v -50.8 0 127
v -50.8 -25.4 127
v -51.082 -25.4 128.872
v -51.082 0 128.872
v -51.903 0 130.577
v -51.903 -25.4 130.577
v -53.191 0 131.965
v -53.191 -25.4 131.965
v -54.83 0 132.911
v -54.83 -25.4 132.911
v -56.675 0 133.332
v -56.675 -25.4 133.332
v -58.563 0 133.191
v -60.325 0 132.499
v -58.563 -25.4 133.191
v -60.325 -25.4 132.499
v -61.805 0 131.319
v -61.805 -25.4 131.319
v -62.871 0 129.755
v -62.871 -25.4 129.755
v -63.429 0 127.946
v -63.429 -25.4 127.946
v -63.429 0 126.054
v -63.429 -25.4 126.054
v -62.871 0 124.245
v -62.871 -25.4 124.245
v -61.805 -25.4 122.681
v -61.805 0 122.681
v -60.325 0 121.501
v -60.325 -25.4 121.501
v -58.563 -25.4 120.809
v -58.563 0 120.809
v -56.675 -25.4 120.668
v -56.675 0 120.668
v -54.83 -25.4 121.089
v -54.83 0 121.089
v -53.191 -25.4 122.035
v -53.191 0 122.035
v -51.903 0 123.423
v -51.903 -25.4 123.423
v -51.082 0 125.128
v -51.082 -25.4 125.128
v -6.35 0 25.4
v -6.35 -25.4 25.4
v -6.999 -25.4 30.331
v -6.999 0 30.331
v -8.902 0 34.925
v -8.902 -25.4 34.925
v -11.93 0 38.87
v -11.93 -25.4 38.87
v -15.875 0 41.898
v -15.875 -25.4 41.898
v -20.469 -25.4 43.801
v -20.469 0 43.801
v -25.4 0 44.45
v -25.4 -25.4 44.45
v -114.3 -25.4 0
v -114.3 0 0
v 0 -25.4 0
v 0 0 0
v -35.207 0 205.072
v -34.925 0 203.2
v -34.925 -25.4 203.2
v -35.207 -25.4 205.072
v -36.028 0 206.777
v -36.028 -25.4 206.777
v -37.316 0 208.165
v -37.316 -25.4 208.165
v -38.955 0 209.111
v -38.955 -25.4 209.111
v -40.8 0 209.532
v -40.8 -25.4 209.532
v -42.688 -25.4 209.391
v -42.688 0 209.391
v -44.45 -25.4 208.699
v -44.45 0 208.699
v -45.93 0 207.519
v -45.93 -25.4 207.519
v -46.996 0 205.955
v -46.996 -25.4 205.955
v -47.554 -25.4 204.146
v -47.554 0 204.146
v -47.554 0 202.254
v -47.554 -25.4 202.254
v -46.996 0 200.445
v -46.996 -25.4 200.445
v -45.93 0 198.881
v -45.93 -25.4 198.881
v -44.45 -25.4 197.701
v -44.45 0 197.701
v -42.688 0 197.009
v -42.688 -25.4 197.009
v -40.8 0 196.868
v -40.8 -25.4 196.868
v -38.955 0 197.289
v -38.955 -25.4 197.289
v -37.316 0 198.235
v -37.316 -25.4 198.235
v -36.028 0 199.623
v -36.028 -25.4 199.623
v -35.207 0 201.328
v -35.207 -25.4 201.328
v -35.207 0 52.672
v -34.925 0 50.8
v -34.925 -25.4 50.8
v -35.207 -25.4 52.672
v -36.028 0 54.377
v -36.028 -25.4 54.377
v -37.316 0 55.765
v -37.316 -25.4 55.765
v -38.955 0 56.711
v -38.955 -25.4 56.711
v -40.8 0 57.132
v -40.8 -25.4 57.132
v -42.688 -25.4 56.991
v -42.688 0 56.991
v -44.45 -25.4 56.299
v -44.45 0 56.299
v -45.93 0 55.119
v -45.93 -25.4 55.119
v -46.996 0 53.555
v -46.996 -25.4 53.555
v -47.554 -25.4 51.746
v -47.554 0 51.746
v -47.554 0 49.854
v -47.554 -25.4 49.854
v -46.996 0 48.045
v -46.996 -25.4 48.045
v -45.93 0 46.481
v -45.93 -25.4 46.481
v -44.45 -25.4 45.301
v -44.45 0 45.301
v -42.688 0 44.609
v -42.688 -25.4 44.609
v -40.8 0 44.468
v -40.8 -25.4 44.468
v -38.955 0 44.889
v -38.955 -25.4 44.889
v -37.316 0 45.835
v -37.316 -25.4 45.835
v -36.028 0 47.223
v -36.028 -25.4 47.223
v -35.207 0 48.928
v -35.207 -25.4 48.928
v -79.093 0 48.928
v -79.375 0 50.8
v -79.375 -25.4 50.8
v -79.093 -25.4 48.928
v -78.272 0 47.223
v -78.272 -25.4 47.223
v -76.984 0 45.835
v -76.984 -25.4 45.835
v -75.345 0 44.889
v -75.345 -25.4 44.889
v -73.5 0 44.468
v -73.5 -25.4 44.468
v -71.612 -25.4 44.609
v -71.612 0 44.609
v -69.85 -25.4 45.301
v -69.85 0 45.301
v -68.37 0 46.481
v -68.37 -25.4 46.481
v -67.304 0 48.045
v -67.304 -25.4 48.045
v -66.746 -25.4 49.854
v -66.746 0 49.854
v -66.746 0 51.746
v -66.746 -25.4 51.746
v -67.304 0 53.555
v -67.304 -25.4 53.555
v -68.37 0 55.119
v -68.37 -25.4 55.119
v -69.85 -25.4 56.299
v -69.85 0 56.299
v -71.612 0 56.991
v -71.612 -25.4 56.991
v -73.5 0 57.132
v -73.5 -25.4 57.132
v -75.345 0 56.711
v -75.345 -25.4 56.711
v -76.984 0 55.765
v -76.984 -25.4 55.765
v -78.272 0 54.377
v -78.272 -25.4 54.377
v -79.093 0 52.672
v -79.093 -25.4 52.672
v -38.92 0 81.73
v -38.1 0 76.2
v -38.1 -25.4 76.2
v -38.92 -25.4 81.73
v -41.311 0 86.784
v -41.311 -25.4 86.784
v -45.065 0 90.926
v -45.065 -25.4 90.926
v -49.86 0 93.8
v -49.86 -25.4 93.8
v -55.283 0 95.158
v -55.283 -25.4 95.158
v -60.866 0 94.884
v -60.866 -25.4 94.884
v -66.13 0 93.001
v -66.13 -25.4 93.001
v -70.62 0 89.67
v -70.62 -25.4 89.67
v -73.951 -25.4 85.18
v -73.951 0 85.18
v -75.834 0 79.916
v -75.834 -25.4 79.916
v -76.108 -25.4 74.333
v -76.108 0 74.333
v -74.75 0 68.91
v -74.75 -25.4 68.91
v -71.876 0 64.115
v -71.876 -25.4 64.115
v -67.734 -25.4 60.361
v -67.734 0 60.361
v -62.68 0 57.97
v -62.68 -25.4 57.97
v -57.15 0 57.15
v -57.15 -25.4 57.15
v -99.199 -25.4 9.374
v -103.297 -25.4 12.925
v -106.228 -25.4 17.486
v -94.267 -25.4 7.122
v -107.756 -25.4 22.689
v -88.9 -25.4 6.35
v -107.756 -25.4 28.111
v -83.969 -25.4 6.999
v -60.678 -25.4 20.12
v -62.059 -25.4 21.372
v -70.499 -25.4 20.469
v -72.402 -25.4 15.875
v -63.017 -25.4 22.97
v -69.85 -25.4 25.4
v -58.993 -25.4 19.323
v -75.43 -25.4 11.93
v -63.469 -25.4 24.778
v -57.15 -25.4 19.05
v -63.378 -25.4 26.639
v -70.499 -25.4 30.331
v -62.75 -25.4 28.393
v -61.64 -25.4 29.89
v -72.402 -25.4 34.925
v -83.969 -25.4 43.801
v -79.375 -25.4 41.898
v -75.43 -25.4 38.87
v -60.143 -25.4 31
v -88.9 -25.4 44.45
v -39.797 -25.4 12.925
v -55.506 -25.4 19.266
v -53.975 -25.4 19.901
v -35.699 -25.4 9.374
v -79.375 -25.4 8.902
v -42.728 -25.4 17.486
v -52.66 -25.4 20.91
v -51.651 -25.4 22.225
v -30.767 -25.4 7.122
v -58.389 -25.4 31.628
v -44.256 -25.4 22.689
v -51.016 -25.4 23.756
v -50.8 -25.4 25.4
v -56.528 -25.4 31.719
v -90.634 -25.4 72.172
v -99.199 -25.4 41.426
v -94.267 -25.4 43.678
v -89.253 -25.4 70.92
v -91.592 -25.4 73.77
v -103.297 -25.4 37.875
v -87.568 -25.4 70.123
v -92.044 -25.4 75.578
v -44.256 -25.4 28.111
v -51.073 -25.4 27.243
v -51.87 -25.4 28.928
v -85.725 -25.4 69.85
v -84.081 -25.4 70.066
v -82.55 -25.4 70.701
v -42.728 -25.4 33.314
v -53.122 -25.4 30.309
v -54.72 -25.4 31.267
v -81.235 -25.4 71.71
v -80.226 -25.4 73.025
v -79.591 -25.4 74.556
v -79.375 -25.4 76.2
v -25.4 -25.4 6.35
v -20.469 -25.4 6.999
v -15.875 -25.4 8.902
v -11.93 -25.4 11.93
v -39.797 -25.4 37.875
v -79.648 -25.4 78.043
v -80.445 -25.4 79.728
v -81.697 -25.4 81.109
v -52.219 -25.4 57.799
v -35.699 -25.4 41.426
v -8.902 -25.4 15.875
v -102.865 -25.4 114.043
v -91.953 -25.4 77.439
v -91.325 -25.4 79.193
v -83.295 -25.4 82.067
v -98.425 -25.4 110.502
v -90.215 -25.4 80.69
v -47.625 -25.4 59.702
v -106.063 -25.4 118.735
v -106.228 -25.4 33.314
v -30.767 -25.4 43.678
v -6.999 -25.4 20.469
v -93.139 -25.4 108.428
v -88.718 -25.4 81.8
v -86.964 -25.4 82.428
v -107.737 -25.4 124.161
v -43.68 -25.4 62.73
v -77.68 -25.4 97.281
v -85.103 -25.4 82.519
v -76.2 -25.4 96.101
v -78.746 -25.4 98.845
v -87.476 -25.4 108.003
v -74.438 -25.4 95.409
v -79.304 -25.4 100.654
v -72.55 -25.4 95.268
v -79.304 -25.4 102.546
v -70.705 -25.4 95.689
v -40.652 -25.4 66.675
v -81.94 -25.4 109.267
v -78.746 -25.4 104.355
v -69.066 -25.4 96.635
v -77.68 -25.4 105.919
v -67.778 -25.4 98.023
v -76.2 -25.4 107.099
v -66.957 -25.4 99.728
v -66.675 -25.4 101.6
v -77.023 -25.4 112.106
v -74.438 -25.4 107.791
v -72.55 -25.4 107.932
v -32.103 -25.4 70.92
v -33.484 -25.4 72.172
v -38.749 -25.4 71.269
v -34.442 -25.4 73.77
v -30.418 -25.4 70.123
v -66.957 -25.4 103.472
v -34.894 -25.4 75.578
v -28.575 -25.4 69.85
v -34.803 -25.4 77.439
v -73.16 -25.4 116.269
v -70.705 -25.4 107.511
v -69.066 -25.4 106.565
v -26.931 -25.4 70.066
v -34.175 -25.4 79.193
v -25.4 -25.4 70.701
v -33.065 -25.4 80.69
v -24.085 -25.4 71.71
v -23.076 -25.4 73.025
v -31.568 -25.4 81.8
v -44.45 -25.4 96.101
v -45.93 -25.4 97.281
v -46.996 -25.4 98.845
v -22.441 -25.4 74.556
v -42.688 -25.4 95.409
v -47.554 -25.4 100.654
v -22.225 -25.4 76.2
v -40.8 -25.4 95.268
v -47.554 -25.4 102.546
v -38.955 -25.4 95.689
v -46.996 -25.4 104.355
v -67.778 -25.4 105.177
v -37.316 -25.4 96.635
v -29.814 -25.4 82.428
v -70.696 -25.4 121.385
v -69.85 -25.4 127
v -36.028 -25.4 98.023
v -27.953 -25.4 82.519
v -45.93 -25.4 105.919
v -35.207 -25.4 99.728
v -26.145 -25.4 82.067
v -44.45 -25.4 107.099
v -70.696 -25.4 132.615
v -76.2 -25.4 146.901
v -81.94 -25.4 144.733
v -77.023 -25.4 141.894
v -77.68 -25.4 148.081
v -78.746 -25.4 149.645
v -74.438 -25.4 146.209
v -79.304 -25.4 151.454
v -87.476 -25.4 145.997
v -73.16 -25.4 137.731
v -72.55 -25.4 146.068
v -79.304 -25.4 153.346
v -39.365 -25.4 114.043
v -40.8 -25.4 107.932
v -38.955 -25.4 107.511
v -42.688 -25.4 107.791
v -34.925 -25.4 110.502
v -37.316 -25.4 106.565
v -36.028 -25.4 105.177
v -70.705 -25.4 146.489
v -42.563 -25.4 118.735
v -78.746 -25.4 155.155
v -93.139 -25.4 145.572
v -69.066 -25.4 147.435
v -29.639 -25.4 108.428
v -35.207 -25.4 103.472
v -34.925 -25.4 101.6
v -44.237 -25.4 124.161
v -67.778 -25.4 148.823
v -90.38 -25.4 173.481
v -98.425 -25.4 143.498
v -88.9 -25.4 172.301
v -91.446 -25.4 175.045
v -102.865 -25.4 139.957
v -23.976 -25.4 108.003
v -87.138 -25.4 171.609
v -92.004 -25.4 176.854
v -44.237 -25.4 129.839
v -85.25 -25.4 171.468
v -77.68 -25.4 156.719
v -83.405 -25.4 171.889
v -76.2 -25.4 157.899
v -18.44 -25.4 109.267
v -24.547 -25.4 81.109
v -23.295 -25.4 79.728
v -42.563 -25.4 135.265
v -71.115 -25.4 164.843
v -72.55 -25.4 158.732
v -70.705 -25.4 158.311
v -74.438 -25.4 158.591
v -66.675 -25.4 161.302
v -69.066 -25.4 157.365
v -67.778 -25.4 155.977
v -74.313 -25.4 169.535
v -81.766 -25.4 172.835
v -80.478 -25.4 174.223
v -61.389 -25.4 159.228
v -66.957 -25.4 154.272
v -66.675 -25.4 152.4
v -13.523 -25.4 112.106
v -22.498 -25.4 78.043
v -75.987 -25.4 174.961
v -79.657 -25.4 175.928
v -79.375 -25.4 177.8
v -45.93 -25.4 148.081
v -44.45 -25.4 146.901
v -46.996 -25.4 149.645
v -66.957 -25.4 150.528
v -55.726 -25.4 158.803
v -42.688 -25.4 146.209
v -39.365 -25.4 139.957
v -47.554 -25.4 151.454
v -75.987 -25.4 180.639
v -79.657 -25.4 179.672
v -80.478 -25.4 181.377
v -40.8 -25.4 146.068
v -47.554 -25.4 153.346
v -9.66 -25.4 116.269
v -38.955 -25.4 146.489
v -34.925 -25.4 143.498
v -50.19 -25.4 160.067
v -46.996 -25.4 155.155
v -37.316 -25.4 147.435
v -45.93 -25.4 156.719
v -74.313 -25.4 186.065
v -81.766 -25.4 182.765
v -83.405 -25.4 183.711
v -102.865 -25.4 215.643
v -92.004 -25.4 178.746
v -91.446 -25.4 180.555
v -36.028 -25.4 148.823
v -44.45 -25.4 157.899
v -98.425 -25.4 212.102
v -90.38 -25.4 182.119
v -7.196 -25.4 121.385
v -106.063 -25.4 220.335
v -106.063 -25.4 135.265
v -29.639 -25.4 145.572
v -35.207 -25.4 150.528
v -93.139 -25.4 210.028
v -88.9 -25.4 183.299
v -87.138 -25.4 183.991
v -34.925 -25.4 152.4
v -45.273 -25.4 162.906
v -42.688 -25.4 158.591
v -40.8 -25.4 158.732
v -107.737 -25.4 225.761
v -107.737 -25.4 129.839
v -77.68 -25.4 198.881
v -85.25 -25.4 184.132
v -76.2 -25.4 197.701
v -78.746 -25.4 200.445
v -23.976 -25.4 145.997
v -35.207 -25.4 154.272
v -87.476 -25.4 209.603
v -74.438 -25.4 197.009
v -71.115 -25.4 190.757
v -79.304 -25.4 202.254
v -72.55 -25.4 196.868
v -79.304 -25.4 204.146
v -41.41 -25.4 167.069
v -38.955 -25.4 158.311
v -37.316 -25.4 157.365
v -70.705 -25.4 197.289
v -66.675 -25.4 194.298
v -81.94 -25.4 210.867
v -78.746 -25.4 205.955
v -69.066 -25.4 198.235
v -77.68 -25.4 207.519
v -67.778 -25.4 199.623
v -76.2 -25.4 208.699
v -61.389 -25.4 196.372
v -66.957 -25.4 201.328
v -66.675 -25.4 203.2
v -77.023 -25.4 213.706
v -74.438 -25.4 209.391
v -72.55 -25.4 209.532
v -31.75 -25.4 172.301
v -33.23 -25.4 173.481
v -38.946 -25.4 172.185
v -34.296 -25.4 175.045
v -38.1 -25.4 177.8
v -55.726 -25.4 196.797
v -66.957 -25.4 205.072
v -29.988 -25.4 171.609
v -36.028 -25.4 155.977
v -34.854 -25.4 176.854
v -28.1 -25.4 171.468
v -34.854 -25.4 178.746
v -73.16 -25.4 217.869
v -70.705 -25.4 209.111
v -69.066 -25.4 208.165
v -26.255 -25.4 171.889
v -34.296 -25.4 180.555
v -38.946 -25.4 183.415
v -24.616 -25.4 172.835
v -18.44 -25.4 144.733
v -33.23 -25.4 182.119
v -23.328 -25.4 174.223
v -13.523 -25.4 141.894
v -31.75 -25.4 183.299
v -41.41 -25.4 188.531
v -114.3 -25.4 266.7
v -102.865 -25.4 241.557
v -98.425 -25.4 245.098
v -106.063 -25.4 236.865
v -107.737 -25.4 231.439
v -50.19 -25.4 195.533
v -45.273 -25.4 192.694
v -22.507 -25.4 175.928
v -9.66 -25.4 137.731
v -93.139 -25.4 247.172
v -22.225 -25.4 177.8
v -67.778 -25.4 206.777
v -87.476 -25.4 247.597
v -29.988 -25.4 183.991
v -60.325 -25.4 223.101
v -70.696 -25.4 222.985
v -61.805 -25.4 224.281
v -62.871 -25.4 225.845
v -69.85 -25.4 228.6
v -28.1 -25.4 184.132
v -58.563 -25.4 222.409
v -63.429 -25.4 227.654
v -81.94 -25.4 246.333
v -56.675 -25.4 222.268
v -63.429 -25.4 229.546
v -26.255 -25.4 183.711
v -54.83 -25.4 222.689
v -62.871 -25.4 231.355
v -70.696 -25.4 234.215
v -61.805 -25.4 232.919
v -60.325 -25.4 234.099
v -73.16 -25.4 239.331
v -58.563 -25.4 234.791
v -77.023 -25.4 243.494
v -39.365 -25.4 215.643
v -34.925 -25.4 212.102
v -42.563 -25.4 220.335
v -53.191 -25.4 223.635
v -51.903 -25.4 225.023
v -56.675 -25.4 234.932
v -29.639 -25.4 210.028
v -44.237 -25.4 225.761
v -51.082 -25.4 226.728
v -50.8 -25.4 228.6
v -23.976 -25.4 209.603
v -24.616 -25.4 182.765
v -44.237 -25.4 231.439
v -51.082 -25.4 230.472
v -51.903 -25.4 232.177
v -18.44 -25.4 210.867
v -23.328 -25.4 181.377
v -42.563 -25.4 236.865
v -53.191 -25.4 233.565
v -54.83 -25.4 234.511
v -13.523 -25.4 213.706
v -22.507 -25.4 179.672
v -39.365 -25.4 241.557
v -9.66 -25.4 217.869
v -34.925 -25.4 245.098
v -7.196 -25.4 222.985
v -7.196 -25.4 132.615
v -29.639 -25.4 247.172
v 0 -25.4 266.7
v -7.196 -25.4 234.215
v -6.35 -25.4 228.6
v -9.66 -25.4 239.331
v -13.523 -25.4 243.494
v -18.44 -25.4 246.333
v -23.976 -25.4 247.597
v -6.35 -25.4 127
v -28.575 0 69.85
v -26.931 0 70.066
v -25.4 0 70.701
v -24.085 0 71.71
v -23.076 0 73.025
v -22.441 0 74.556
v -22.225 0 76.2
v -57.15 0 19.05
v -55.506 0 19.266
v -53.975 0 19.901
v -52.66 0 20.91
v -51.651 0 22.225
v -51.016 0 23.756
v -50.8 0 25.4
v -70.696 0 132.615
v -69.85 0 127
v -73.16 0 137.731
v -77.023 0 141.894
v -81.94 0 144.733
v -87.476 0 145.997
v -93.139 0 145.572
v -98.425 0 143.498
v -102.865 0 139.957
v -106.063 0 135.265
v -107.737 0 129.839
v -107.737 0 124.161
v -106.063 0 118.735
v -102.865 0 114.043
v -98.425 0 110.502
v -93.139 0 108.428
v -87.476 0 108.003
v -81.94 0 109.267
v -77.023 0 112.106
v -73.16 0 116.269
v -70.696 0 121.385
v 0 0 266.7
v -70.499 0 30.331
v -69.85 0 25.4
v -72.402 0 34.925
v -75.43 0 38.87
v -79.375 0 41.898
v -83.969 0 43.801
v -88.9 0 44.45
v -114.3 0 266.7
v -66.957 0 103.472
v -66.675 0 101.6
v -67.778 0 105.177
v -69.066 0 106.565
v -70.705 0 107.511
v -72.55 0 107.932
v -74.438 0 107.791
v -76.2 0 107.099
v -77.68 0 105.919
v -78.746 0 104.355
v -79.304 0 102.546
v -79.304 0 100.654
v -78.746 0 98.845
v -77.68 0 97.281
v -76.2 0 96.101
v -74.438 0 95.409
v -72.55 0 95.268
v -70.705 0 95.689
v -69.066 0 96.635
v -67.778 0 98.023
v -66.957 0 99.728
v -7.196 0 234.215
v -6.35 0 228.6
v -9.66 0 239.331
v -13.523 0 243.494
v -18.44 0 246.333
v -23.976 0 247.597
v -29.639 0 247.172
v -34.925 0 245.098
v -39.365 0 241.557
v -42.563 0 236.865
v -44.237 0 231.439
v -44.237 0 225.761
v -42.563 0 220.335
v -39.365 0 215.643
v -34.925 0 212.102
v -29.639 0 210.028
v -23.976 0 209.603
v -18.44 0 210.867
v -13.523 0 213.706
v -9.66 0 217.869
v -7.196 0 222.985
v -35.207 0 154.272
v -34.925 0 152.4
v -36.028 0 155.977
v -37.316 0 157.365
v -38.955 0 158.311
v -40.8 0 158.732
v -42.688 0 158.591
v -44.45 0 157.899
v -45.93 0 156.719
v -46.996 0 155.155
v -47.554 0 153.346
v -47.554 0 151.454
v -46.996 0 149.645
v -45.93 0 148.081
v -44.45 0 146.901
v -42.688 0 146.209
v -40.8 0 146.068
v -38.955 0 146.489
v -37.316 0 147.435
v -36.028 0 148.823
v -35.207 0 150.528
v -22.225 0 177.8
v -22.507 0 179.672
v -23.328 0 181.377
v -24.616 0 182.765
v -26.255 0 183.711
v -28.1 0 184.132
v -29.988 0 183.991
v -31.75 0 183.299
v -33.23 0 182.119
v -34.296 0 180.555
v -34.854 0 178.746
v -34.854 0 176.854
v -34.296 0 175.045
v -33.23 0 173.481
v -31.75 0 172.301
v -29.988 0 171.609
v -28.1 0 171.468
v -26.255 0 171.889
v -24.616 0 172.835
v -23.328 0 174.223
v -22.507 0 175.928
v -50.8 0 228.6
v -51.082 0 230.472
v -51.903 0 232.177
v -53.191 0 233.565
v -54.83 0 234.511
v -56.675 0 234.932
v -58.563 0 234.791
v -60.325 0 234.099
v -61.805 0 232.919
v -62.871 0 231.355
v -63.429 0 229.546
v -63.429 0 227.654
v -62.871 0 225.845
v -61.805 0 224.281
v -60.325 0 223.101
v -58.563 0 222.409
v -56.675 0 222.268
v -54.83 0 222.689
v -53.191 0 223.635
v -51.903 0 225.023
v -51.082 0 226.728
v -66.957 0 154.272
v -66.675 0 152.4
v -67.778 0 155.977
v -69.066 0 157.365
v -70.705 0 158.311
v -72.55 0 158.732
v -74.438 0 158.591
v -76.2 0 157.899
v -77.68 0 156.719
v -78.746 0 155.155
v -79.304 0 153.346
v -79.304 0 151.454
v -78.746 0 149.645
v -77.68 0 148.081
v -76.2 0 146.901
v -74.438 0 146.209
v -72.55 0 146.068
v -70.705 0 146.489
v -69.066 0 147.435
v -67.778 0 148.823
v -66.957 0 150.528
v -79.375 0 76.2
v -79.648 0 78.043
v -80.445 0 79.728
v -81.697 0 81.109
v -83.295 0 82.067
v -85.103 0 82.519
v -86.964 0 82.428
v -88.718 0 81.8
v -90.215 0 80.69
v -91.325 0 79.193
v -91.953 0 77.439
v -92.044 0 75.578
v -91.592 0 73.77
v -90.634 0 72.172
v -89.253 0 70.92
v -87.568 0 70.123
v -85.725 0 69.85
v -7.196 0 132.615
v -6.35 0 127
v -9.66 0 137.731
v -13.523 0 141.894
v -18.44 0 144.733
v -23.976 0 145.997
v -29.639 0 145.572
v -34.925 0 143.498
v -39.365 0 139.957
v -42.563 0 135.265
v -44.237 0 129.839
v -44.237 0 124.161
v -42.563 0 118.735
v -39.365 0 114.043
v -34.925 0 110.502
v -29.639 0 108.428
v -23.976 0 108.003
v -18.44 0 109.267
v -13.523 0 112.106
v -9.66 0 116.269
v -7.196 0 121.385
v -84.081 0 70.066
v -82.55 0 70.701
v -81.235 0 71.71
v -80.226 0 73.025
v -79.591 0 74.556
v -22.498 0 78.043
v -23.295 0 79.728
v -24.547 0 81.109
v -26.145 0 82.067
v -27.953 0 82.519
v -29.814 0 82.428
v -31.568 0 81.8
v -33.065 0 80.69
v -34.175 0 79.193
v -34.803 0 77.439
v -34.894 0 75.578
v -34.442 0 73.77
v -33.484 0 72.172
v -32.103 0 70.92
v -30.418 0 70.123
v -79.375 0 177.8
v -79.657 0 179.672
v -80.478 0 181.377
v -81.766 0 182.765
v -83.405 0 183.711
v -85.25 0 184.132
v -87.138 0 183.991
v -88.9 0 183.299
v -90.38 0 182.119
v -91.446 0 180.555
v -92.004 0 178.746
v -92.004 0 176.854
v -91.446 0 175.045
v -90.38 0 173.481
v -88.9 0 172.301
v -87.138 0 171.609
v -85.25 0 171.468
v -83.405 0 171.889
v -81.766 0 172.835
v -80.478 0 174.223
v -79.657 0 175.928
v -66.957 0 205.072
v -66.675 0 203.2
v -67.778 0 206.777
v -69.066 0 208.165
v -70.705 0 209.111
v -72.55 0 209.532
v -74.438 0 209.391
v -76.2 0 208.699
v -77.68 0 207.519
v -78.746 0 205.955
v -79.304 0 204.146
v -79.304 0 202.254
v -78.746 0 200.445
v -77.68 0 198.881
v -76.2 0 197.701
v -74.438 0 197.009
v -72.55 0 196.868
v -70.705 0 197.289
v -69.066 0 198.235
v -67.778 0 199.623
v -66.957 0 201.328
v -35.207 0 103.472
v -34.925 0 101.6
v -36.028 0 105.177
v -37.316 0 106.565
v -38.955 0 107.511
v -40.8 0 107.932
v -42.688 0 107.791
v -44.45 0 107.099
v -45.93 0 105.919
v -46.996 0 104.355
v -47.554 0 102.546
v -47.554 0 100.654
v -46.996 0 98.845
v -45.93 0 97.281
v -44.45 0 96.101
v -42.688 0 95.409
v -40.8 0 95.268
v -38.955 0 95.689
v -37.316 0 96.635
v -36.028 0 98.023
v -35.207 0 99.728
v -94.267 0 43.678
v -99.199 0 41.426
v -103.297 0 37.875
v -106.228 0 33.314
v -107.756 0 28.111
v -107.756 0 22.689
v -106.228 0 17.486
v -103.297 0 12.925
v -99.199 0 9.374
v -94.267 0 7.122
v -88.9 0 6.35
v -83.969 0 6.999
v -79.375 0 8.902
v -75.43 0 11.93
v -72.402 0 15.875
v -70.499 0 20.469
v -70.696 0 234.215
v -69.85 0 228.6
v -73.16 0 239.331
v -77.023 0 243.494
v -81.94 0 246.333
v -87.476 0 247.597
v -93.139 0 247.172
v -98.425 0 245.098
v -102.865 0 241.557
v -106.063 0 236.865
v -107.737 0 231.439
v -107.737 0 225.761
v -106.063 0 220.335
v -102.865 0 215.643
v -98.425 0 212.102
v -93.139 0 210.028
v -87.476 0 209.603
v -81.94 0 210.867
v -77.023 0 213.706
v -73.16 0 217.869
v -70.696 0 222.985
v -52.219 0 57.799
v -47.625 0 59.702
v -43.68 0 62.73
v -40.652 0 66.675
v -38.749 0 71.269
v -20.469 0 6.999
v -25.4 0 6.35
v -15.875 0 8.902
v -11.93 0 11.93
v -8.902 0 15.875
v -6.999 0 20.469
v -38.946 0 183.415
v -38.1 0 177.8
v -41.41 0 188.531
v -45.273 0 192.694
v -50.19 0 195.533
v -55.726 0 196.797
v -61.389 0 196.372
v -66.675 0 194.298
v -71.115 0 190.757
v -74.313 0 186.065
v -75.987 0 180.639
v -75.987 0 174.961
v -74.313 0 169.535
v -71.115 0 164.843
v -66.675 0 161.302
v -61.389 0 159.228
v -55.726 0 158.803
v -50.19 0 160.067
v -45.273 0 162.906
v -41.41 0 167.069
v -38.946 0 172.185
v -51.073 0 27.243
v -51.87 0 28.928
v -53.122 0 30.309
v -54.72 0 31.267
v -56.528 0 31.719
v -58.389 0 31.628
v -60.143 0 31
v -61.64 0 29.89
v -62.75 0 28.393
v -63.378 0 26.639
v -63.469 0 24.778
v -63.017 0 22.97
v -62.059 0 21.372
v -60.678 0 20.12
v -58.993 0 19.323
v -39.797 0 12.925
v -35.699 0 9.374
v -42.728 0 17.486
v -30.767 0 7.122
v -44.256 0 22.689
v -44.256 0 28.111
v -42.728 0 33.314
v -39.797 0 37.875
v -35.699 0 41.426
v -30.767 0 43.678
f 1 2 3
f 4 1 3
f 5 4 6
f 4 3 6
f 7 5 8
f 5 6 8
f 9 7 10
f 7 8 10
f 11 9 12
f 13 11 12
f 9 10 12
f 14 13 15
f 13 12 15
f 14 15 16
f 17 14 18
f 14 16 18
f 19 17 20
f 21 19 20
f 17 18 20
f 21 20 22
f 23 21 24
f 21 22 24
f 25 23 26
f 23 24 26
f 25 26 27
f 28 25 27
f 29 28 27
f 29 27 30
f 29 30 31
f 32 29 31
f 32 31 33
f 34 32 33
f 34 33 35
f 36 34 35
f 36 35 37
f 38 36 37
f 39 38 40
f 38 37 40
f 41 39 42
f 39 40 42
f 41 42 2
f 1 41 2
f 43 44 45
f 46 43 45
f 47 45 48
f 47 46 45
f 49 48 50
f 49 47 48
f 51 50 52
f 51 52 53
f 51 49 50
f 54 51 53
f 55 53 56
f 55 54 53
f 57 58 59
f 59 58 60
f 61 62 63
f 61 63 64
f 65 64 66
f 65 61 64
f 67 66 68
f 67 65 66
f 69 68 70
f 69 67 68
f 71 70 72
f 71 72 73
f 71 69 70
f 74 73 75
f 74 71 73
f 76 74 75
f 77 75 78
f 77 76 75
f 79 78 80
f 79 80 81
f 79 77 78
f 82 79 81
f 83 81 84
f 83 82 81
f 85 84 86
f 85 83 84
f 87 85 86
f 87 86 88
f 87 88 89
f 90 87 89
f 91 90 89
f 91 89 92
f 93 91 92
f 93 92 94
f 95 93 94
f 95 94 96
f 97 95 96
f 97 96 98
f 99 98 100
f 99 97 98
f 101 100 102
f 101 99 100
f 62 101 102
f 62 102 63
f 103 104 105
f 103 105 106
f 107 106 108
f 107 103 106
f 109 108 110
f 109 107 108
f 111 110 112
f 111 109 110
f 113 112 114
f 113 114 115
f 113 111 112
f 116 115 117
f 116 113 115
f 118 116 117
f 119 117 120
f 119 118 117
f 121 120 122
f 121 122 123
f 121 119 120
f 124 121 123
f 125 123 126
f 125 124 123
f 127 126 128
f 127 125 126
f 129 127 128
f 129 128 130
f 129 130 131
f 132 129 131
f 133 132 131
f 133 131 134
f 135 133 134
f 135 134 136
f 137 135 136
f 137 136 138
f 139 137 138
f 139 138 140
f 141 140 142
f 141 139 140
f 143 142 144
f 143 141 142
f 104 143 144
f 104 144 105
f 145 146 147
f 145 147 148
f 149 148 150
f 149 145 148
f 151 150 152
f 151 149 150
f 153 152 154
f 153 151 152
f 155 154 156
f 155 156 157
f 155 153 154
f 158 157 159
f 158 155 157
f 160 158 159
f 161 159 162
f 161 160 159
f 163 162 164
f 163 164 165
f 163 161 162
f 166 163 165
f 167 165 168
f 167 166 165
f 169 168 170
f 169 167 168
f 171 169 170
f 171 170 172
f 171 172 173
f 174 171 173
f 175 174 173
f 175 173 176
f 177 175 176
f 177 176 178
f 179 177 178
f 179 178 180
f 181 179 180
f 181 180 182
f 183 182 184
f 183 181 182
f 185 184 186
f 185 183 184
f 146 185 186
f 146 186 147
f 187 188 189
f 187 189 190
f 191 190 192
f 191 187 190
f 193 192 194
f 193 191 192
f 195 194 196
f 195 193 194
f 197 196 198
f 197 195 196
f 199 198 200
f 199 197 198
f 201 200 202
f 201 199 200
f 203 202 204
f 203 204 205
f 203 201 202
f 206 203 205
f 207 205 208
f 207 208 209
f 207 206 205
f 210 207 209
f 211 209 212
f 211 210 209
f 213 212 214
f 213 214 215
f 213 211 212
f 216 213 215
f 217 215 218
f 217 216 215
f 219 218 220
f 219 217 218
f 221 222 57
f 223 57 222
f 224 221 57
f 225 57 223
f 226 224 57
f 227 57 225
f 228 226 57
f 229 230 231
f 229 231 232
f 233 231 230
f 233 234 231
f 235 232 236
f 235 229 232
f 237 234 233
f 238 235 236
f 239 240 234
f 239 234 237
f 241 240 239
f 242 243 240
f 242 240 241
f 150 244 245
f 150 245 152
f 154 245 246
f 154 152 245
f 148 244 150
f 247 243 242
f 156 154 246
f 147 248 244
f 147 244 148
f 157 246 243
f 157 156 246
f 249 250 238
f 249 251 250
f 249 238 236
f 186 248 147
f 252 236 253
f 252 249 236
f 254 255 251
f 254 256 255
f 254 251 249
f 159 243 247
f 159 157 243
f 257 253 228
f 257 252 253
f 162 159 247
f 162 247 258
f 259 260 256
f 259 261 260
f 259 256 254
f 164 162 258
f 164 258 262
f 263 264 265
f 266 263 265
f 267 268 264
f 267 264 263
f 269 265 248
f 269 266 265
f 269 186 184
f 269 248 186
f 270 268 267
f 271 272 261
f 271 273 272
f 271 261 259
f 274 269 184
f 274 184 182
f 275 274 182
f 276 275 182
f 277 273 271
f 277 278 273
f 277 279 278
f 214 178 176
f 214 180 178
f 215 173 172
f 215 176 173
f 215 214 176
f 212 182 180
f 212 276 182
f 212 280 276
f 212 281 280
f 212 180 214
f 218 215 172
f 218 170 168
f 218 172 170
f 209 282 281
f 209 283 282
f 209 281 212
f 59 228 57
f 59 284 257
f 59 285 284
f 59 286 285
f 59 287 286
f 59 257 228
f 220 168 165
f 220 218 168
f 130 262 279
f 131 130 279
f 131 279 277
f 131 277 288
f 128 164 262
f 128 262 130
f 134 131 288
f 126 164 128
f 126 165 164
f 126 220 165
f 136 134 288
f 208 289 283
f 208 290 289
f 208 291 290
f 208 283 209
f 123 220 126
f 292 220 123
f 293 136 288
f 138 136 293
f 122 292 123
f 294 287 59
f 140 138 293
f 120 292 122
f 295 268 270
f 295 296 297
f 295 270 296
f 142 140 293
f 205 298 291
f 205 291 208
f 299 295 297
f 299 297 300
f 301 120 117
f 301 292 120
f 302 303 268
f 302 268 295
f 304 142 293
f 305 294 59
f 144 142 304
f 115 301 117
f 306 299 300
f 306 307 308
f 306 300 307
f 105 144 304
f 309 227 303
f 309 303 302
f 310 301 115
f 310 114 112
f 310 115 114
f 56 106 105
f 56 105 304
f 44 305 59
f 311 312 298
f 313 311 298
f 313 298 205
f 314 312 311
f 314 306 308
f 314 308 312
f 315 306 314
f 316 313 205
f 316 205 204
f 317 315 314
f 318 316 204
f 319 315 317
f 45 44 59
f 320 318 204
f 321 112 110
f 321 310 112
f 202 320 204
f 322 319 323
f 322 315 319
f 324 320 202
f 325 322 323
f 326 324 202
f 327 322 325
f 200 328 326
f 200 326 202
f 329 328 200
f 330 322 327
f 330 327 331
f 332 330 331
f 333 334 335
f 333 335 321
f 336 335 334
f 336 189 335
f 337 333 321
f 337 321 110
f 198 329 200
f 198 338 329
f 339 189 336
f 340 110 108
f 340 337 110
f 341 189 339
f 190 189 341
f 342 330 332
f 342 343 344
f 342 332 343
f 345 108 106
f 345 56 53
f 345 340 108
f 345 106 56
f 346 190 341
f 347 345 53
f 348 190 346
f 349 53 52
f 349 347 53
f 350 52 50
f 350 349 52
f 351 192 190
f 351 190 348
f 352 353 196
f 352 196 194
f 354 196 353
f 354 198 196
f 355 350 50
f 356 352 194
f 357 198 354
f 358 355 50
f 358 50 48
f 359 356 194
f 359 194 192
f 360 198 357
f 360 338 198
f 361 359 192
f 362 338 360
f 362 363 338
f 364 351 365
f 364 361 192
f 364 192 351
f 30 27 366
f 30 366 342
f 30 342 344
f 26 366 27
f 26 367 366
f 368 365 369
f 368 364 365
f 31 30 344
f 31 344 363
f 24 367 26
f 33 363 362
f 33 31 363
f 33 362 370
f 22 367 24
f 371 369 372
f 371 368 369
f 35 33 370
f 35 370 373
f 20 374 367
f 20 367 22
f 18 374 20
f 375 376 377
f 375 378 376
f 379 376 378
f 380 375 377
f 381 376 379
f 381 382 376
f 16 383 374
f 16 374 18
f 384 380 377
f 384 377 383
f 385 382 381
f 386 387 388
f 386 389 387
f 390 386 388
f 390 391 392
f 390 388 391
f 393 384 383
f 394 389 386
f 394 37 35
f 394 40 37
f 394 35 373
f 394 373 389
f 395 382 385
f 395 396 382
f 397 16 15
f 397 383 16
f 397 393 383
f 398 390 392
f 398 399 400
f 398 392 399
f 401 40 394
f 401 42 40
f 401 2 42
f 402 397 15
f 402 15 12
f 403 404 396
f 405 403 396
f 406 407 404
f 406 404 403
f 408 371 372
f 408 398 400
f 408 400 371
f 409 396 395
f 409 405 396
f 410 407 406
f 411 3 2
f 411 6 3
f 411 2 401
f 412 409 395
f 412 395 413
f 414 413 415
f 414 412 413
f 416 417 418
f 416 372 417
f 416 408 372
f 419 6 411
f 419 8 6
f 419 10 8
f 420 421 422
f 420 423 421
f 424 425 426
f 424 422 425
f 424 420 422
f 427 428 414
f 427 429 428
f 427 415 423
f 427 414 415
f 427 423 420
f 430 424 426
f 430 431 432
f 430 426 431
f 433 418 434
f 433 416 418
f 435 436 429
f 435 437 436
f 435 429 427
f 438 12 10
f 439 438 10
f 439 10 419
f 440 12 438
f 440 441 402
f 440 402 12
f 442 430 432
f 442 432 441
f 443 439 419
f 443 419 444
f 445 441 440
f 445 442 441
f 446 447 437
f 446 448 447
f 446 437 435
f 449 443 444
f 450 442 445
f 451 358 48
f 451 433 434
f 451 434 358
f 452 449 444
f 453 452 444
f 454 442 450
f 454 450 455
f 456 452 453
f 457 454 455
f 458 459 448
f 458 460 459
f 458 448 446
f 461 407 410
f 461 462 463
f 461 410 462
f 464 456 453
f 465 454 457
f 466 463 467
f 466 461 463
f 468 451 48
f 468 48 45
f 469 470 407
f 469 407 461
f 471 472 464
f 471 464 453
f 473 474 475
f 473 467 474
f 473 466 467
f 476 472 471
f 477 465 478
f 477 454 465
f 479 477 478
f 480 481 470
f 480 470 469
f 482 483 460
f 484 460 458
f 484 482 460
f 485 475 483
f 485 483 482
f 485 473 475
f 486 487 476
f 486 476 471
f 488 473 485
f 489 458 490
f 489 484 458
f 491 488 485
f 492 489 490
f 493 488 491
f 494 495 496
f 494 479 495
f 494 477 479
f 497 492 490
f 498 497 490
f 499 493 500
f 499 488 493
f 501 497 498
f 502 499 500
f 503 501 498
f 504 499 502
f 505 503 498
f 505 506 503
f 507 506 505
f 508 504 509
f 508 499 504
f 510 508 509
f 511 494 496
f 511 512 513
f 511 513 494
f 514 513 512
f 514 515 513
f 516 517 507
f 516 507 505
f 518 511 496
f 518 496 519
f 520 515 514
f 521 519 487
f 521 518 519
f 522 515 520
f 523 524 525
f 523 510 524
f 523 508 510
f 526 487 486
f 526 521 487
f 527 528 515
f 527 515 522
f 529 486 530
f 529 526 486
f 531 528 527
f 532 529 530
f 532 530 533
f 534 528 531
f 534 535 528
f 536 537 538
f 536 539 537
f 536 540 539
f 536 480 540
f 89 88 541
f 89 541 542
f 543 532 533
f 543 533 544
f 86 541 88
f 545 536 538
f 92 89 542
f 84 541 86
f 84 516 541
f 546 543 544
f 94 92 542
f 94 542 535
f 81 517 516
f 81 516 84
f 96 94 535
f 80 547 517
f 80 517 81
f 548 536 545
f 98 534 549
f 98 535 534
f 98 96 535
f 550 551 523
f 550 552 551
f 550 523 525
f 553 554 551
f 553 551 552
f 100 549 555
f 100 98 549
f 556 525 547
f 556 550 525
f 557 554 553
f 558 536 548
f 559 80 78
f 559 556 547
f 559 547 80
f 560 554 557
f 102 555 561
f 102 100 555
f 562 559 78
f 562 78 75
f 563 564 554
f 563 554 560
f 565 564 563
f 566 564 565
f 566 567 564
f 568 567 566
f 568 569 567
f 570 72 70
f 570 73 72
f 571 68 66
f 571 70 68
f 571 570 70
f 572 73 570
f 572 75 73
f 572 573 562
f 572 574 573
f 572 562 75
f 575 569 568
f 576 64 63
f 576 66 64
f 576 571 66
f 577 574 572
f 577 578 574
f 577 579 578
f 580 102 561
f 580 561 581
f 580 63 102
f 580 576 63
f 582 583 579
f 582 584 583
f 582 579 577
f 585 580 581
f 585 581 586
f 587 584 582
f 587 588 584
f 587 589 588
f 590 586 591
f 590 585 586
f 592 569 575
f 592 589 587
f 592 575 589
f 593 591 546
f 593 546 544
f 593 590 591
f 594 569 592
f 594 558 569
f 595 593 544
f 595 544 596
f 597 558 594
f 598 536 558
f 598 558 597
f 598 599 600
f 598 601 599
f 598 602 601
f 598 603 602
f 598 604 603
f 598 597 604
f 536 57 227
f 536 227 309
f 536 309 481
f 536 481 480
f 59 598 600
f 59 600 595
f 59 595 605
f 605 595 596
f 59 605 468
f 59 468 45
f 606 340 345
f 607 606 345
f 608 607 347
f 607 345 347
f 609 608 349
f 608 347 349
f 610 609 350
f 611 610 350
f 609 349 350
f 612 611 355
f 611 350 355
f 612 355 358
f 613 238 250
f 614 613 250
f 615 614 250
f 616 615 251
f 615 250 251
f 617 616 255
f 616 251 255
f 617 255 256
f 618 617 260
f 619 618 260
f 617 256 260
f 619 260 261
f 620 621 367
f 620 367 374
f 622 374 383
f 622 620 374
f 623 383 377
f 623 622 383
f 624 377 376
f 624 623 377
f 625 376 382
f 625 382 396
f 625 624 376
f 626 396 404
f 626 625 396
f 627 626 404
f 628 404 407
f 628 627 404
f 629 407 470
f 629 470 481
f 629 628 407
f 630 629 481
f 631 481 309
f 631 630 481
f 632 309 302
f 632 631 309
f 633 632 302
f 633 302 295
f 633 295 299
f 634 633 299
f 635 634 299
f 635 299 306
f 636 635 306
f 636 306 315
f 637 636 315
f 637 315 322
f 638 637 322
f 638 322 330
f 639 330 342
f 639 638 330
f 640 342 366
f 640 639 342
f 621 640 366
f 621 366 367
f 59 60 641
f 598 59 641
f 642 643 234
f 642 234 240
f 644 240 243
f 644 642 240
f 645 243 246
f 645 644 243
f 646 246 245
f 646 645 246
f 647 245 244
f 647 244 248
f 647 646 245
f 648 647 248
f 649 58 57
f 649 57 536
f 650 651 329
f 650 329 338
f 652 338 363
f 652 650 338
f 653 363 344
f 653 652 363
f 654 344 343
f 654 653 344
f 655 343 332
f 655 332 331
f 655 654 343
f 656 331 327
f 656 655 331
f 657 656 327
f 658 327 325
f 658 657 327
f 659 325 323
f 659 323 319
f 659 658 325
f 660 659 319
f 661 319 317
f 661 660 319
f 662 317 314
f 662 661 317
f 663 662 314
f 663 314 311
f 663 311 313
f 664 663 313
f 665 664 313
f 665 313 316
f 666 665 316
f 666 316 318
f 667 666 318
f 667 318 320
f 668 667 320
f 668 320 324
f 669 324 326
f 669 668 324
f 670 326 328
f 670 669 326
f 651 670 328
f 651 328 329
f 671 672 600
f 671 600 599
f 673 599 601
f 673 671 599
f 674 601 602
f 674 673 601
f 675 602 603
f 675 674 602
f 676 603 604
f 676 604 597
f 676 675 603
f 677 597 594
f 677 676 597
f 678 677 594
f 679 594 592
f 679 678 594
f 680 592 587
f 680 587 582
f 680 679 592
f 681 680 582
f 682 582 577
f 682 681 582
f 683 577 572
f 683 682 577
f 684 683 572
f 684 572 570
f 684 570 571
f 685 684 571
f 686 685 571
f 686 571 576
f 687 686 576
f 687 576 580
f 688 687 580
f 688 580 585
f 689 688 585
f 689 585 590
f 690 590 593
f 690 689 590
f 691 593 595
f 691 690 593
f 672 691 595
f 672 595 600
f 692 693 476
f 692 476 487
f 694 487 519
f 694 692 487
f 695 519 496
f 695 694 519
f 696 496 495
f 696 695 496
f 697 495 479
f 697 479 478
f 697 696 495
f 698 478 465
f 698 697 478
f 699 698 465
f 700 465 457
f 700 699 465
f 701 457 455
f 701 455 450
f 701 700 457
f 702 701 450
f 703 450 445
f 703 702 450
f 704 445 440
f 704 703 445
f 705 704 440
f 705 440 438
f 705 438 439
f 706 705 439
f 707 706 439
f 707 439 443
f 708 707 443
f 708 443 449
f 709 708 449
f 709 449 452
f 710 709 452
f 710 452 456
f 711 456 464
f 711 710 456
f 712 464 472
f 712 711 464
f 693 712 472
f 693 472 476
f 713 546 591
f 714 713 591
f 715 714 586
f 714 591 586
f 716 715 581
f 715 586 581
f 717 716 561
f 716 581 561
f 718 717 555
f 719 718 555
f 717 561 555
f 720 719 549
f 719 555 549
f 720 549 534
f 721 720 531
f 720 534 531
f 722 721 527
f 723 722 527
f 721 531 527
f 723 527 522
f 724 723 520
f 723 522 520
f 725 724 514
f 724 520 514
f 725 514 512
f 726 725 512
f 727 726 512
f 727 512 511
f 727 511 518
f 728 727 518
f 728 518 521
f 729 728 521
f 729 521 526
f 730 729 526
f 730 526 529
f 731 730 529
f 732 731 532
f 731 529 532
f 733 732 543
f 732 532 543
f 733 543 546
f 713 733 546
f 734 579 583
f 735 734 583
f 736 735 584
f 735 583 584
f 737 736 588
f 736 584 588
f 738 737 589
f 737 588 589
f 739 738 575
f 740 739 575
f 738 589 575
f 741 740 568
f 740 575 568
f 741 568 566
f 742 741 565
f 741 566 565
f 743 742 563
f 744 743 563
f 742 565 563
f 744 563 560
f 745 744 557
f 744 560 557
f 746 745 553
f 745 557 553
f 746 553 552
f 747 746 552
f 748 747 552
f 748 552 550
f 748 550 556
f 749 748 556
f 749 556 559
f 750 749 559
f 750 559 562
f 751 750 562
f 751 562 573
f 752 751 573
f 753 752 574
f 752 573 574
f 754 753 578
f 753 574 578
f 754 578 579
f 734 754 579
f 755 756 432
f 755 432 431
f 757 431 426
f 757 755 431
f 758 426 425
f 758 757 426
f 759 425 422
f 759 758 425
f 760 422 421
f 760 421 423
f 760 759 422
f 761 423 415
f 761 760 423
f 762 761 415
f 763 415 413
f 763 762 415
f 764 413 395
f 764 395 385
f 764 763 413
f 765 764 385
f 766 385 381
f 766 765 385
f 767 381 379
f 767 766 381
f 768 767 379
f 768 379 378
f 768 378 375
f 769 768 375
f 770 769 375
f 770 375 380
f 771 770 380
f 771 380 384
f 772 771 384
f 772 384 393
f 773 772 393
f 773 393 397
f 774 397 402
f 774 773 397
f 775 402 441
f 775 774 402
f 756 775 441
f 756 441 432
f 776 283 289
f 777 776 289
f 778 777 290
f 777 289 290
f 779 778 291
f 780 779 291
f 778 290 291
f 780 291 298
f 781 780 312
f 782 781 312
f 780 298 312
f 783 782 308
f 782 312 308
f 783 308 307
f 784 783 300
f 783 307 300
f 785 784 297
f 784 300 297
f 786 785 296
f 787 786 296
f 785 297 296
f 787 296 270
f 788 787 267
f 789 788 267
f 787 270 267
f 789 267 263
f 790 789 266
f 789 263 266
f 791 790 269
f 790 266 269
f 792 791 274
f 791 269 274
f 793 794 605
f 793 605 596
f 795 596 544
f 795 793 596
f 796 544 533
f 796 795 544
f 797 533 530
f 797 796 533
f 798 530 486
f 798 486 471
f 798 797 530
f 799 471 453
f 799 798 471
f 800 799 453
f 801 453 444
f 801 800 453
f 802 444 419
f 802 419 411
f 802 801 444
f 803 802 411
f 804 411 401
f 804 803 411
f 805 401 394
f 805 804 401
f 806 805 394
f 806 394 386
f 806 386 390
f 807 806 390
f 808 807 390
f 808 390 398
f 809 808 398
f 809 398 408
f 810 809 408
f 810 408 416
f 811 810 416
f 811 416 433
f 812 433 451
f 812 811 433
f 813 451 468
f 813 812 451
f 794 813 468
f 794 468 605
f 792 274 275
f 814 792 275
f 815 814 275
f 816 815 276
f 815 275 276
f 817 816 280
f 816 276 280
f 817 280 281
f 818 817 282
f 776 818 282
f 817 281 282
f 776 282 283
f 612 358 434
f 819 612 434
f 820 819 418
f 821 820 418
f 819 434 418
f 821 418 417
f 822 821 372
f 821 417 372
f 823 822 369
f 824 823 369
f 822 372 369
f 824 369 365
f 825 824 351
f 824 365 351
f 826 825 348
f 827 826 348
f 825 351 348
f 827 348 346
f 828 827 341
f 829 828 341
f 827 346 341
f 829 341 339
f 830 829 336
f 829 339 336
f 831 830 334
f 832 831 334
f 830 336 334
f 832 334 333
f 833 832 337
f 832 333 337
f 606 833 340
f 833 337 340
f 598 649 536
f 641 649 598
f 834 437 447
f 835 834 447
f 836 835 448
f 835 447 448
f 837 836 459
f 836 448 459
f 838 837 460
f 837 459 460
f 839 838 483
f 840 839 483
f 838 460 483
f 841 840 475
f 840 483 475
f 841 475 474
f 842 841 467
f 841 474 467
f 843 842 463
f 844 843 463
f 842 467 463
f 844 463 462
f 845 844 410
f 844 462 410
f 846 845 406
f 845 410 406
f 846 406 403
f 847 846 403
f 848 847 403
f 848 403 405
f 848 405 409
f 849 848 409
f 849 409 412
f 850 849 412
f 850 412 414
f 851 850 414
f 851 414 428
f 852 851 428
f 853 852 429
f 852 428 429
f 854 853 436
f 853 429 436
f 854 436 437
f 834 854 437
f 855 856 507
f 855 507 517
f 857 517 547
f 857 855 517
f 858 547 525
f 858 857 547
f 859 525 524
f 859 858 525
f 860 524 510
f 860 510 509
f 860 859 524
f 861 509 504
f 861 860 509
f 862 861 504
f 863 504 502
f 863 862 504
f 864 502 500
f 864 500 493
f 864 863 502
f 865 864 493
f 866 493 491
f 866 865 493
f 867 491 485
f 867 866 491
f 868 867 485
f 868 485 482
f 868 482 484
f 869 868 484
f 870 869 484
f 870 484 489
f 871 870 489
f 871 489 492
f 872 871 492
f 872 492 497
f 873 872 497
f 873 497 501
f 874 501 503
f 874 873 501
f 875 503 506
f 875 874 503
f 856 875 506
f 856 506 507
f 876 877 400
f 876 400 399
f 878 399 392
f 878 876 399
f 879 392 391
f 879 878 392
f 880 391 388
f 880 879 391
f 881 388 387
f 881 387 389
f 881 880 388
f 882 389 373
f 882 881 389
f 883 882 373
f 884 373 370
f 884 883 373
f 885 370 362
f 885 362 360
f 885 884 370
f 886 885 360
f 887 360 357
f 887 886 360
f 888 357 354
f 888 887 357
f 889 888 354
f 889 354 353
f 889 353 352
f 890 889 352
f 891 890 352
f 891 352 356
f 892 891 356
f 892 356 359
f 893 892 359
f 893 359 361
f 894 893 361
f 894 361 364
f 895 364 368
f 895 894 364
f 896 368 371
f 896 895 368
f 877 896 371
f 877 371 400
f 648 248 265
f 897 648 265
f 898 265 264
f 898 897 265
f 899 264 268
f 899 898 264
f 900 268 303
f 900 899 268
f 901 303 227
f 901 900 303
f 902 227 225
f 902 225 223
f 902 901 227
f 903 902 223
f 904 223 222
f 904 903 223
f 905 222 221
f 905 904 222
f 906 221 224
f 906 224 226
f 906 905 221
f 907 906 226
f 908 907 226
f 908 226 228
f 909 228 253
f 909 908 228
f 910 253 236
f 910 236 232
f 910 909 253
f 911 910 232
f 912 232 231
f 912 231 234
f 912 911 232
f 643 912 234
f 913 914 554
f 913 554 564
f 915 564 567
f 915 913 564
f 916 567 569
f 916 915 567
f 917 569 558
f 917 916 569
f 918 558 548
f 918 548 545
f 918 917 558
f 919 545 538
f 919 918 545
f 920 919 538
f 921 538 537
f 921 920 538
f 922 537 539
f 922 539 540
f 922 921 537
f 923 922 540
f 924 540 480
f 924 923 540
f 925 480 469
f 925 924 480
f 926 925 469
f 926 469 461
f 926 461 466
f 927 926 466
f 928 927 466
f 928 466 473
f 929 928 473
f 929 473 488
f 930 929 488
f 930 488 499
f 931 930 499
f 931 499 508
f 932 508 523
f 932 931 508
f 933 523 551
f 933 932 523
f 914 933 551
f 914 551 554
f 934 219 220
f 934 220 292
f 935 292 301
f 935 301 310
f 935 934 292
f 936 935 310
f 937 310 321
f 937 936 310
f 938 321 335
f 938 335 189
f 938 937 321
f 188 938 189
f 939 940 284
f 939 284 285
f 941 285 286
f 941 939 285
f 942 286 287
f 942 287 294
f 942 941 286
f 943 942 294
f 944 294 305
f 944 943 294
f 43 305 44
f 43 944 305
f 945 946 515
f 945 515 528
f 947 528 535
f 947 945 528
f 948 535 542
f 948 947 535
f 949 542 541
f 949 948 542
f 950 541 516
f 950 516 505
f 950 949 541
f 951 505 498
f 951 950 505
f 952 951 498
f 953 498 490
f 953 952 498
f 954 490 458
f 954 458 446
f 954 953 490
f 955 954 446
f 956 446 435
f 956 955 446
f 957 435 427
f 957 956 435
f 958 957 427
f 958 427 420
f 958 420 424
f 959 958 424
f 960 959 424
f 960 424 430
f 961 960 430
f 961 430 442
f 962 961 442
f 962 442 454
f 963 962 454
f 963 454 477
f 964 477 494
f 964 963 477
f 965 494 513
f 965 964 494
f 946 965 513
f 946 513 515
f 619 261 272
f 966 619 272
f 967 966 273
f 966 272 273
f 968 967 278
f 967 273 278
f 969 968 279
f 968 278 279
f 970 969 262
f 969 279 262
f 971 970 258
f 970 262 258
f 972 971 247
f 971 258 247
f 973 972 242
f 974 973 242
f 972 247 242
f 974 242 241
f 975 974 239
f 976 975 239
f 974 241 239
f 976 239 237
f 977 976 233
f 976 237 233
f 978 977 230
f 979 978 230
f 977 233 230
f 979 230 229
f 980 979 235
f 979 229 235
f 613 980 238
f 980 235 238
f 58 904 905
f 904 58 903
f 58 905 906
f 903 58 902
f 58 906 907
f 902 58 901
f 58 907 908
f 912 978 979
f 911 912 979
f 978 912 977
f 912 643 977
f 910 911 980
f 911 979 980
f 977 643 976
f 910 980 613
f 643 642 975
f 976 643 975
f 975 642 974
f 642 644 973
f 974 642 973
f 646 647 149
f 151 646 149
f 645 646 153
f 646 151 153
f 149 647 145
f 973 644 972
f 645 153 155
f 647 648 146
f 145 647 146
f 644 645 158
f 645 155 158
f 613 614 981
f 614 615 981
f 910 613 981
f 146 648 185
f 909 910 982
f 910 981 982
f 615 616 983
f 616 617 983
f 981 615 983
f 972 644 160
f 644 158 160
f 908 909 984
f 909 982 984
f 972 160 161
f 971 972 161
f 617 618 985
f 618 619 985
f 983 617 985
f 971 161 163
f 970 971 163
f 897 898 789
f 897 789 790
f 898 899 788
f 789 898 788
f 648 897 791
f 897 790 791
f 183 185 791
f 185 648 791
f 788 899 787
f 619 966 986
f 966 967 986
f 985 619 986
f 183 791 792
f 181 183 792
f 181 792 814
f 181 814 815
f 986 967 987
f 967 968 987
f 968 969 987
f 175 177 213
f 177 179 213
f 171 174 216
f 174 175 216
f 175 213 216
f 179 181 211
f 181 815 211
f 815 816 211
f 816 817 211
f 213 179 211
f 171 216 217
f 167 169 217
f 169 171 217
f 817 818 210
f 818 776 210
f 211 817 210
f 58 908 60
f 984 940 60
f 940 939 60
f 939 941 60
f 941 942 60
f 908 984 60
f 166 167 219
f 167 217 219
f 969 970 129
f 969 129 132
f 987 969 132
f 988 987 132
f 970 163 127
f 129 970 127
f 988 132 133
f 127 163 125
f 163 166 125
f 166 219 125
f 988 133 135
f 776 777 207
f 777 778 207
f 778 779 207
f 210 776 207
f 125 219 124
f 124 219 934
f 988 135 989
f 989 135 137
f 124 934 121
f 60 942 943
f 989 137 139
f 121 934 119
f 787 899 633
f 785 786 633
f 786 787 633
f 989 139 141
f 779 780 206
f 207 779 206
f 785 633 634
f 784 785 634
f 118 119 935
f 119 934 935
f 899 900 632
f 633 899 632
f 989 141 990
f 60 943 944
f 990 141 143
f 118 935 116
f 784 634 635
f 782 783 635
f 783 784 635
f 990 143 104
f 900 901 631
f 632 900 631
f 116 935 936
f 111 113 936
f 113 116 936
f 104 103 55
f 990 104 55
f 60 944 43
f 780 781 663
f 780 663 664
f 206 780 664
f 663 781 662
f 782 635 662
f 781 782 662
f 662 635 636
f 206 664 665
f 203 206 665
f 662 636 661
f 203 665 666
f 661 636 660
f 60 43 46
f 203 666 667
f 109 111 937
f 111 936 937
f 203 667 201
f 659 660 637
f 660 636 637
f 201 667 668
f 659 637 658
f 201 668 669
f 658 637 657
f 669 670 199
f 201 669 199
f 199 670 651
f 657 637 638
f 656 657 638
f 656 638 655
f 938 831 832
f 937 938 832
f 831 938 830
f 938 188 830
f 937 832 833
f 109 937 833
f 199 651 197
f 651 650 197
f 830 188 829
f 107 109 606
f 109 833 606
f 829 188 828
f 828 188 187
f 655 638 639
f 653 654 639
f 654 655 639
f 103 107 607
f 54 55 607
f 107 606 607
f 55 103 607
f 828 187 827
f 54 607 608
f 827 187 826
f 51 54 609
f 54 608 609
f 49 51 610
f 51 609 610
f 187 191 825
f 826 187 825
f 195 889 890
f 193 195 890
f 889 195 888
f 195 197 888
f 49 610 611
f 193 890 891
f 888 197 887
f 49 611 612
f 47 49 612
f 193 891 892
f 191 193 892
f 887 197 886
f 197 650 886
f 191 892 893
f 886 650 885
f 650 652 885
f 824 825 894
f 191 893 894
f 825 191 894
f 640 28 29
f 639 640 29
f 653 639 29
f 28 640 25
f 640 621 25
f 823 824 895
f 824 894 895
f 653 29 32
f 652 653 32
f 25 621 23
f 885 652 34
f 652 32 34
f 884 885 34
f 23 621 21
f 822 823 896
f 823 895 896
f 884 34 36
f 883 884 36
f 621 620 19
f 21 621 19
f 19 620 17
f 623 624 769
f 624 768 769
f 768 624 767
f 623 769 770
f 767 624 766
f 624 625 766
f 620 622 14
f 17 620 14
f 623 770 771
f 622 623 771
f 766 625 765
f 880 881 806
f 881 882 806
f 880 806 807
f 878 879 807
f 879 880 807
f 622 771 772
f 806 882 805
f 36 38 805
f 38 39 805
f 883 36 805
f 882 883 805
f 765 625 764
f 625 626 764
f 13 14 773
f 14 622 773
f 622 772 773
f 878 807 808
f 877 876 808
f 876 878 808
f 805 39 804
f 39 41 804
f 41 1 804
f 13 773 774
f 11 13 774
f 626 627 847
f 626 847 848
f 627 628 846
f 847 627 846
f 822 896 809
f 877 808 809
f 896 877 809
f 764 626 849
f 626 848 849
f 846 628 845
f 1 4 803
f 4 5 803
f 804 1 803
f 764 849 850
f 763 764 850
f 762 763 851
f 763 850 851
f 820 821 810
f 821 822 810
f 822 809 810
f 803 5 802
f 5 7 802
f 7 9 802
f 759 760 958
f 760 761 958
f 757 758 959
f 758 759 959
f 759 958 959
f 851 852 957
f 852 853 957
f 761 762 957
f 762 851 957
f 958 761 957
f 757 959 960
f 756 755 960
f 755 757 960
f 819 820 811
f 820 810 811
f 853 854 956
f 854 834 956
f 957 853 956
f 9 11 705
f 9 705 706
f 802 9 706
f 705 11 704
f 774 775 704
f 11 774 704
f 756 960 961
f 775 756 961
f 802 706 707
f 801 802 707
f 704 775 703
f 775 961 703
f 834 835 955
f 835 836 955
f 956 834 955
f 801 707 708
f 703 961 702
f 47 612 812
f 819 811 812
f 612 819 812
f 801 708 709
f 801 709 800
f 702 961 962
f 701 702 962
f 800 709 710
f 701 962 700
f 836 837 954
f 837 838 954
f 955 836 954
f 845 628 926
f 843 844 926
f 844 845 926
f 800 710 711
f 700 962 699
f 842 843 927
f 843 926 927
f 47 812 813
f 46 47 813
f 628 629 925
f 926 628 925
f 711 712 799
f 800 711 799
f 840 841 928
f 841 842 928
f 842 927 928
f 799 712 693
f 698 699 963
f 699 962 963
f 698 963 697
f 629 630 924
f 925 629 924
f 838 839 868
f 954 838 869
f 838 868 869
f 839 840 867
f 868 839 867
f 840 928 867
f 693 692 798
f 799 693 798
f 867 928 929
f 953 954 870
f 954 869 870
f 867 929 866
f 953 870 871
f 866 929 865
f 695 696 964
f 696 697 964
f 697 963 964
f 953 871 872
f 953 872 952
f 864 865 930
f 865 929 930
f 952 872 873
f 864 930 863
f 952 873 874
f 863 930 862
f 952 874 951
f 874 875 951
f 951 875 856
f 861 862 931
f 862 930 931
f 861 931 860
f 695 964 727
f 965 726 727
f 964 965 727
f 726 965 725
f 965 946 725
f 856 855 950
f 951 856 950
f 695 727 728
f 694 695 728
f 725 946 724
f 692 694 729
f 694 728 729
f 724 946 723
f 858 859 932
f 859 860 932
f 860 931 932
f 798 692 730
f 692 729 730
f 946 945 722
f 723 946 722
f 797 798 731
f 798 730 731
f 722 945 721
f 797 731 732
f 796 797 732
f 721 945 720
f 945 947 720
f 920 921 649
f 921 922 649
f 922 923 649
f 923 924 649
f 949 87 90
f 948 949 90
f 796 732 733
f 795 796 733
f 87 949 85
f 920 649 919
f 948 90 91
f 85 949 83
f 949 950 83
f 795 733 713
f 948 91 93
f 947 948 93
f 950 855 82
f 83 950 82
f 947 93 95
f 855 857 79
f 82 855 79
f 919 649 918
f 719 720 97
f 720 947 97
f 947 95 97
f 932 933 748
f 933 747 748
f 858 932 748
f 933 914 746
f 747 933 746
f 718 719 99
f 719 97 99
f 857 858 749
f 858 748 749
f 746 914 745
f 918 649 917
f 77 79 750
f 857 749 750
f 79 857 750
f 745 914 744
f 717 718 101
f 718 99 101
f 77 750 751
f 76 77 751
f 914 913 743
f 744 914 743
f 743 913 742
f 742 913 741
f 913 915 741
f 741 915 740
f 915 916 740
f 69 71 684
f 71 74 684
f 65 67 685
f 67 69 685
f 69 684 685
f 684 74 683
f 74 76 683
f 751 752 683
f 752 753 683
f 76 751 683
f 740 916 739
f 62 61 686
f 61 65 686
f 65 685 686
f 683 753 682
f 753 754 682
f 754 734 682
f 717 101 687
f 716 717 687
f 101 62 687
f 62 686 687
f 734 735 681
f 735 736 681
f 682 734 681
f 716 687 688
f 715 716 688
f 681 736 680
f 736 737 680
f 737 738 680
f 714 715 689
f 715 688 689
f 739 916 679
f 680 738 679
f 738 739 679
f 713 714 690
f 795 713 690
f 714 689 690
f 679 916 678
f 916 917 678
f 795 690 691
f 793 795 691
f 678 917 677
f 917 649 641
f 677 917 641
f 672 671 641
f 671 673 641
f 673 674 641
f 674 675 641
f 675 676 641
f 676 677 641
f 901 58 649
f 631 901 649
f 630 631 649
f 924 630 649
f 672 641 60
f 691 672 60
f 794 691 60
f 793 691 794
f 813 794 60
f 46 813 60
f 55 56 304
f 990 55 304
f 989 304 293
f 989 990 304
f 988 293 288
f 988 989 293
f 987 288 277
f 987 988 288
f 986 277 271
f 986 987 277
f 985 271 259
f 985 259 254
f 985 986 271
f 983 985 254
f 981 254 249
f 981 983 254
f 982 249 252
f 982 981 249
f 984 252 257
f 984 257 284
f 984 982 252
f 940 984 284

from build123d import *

# Parameters (mm, degrees)
F0_W     = 114.3
F0_H     = 266.7
F2_DEPTH = 25.4
F1_R     = 6.35
F1_R_2   = 19.05
F3_DEPTH = 25.4
F5_R     = 6.35
F6_DEPTH = 25.4


with BuildPart() as f2:
    # F0 (on Front) → F2 (new body)
    with BuildSketch(Plane.XZ):
        with Locations((-57.15, 133.35)):
            Rectangle(F0_W, F0_H)
    extrude(amount=F2_DEPTH)

    # F1 (on face) → F3 (cut)
    with BuildSketch(Plane.XZ):
        with BuildLine():
            ThreePointArc((-66.675, 50.8), (-73.025, 57.15), (-79.375, 50.8))
            ThreePointArc((-79.375, 50.8), (-73.025, 44.45), (-66.675, 50.8))
        make_face()
        with BuildLine():
            ThreePointArc((-88.9, 44.45), (-107.95, 25.4), (-88.9, 6.35))
            Line((-88.9, 6.35), (-88.9, 25.4))
            Line((-88.9, 25.4), (-88.9, 44.45))
        make_face()
        with BuildLine():
            Line((-88.9, 25.4), (-88.9, 6.35))
            ThreePointArc((-88.9, 6.35), (-75.429616, 11.929616), (-69.85, 25.4))
            ThreePointArc((-69.85, 25.4), (-75.429616, 38.870384), (-88.9, 44.45))
            Line((-88.9, 44.45), (-88.9, 25.4))
        make_face()
        with BuildLine():
            ThreePointArc((-38.1, 76.2), (-70.620384, 89.670384), (-57.15, 57.15))
            ThreePointArc((-57.15, 57.15), (-43.679616, 62.729616), (-38.1, 76.2))
        make_face()
        with Locations((-41.275, 50.8)):
            Circle(F1_R)
        with BuildLine():
            ThreePointArc((-25.4, 44.45), (-44.45, 25.4), (-25.4, 6.35))
            Line((-25.4, 6.35), (-25.4, 25.4))
            Line((-25.4, 25.4), (-25.4, 44.45))
        make_face()
        with BuildLine():
            Line((-25.4, 25.4), (-25.4, 6.35))
            ThreePointArc((-25.4, 6.35), (-11.929616, 11.929616), (-6.35, 25.4))
            ThreePointArc((-6.35, 25.4), (-11.929616, 38.870384), (-25.4, 44.45))
            Line((-25.4, 44.45), (-25.4, 25.4))
        make_face()
        with Locations((-73.025, 101.6)):
            Circle(F1_R)
        with Locations((-41.275, 101.6)):
            Circle(F1_R)
        with Locations((-73.025, 152.4)):
            Circle(F1_R)
        with Locations((-41.275, 152.4)):
            Circle(F1_R)
        with Locations((-88.9, 127)):
            Circle(F1_R_2)
        with Locations((-25.4, 127)):
            Circle(F1_R_2)
        with Locations((-73.025, 203.2)):
            Circle(F1_R)
        with Locations((-41.275, 203.2)):
            Circle(F1_R)
        with Locations((-57.15, 177.8)):
            Circle(F1_R_2)
        with Locations((-88.9, 228.6)):
            Circle(F1_R_2)
        with Locations((-25.4, 228.6)):
            Circle(F1_R_2)
    extrude(amount=F3_DEPTH, mode=Mode.SUBTRACT)

    # F5 (on face) → F6 (cut)
    with BuildSketch(Plane.XZ.offset(25.4)):
        with BuildLine():
            ThreePointArc((-79.375, 76.2), (-90.215128, 80.690128), (-85.725, 69.85))
            ThreePointArc((-85.725, 69.85), (-81.234872, 71.709872), (-79.375, 76.2))
        make_face()
        with BuildLine():
            ThreePointArc((-50.8, 25.4), (-61.640128, 29.890128), (-57.15, 19.05))
            ThreePointArc((-57.15, 19.05), (-52.659872, 20.909872), (-50.8, 25.4))
        make_face()
        with BuildLine():
            ThreePointArc((-22.225, 76.2), (-33.065128, 80.690128), (-28.575, 69.85))
            ThreePointArc((-28.575, 69.85), (-24.084872, 71.709872), (-22.225, 76.2))
        make_face()
        with Locations((-85.725, 177.8)):
            Circle(F5_R)
        with Locations((-28.575, 177.8)):
            Circle(F5_R)
        with Locations((-57.15, 127)):
            Circle(F5_R)
        with Locations((-57.15, 228.6)):
            Circle(F5_R)
    extrude(amount=-F6_DEPTH, mode=Mode.SUBTRACT)


solid = f2.part
